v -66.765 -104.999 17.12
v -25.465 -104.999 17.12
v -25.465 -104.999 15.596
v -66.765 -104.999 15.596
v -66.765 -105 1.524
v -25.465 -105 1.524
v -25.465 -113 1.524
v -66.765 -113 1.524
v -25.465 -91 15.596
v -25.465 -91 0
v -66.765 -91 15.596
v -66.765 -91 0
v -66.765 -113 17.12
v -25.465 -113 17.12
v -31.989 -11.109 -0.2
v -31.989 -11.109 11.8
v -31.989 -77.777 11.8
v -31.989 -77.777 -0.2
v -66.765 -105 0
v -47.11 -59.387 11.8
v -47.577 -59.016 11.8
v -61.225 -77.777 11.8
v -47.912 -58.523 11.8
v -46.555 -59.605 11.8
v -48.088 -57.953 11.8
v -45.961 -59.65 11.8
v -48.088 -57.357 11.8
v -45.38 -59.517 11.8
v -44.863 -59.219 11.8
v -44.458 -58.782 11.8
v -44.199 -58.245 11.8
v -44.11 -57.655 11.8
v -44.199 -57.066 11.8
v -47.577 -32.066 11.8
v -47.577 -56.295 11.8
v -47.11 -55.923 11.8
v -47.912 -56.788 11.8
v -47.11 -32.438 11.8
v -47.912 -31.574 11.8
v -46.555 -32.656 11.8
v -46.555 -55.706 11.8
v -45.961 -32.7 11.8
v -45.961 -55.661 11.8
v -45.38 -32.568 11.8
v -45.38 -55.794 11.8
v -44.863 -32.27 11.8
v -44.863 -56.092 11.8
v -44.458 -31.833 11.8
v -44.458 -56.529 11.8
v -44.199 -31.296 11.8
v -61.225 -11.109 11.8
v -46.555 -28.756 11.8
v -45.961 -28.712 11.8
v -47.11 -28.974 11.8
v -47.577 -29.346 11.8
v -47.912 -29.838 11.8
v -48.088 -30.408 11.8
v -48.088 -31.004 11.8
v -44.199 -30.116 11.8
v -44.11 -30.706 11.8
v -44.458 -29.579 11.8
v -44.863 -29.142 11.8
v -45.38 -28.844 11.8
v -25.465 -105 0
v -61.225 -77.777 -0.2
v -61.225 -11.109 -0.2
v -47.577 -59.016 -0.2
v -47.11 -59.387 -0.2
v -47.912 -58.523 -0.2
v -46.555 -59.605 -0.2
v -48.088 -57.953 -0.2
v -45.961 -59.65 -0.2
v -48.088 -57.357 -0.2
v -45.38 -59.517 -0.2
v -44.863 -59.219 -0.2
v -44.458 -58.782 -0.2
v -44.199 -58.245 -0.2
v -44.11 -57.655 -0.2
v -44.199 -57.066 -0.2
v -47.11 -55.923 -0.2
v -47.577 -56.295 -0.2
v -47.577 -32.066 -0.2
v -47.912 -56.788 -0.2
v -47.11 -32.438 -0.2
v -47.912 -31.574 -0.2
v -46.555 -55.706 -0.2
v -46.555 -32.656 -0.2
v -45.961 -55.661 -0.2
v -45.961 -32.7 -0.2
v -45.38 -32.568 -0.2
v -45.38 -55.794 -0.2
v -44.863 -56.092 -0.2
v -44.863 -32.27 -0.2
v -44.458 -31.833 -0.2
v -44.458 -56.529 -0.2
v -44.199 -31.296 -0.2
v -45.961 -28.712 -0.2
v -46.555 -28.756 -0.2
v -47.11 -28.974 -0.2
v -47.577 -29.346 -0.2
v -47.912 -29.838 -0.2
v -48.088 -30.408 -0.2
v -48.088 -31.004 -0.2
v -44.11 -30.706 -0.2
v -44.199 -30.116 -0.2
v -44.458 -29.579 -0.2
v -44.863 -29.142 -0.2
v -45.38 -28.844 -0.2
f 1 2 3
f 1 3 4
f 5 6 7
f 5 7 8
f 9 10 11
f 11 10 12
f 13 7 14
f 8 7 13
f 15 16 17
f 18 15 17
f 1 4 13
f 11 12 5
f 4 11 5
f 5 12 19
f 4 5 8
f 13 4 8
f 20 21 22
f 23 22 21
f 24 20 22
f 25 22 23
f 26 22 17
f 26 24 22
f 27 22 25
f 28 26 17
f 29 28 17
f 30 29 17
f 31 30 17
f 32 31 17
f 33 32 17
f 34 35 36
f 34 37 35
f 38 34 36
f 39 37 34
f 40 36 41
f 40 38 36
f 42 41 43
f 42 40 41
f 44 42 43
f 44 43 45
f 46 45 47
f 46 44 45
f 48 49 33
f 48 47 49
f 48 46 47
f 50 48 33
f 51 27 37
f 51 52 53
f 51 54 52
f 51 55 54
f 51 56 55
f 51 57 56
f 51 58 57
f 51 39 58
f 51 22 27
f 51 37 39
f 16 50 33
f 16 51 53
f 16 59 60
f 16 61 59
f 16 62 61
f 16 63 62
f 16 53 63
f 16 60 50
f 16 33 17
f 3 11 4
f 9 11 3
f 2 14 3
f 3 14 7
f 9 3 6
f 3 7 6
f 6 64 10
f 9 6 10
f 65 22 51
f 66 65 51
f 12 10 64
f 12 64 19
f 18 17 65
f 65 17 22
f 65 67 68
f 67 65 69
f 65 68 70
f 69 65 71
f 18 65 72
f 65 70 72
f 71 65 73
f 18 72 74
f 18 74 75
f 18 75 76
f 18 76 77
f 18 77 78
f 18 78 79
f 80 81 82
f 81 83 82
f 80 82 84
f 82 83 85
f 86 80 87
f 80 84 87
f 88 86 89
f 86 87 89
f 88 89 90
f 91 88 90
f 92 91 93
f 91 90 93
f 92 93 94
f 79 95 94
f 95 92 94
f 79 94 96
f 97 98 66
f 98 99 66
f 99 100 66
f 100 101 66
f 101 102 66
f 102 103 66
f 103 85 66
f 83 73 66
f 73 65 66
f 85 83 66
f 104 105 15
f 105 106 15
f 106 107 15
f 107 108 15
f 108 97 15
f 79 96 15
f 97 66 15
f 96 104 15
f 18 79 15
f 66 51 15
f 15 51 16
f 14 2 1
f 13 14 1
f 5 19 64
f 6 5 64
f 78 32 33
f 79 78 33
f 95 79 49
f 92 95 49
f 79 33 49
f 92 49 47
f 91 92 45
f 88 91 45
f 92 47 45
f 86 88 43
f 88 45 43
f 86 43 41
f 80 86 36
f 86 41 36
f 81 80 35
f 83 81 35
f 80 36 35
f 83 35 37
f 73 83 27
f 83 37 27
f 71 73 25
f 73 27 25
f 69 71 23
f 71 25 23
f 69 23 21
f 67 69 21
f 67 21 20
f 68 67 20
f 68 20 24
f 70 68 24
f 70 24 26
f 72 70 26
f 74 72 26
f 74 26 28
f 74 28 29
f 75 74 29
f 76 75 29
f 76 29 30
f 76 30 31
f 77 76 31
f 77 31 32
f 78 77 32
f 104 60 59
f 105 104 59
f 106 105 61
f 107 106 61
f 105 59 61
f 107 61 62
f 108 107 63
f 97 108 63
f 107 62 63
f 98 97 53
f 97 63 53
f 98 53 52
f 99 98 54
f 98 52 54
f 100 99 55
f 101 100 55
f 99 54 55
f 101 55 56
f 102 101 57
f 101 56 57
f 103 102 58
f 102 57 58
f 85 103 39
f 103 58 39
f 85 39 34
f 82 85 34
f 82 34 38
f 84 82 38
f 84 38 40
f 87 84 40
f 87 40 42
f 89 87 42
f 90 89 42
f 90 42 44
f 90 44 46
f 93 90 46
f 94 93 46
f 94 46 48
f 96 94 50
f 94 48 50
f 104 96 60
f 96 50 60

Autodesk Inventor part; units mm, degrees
ref_plane "YZ Plane" through (0, 0, 0) normal (1, 0, 0) x (0, 1, 0)
ref_plane "XZ Plane" through (0, 0, 0) normal (0, 1, 0) x (-1, 0, 0)
ref_plane "Work Plane1" through (-89.882, 196577.8405, 29.6599) normal (0, 0, -1) x (-1, 0, 0)
ref_plane "Work Plane4" through (-3, 0, 29.6599) normal (0, 1, 0) x (1, 0, 0)
ref_plane "Work Plane5" through (-102.2297, 0, 0) normal (0, 1, 0) x (1, 0, 0)
sketch "Sketch9" plane through (-27.41, -83, 0) normal (0, 0, -1) x (-1, 0, 0)
  line L0 (-24.41, -8) -> (61.8197, -8) construction
  line L1 (-1.9451, -8) -> (-1.9451, -26) construction
  line L2 (39.3549, -26) -> (39.3549, -8) construction
  line L3 (0.0549, -28) -> (37.3549, -28) construction
  line L4 (-1.9451, -8) -> (39.3549, -8)
  line L5 (39.3549, -8) -> (39.3549, -30)
  line L6 (-1.9451, -30) -> (-1.9451, -8)
  line L7 (-1.9451, -30) -> (39.3549, -30)
  point P0 (-27.41, 83)
  dimension "d50" = 2
extrude "Extrusion5" add sketch "Sketch9" against normal blind 17.12
sketch "Sketch12" plane through (-27.41, -83, 17.12) normal (0, 0, 1) x (1, 0, 0)
  line L0 (1.9451, -8) -> (-39.3549, -8) construction
  line L1 (1.9451, -30) -> (1.9451, -8) construction
  line L2 (1.9451, -21.9992) -> (-39.4839, -21.9992) construction
  line L3 (-39.3549, -8) -> (-39.3549, -30) projected
  line L4 (-39.3549, -8) -> (1.9451, -8)
  line L5 (1.9451, -8) -> (1.9451, -21.9992)
  line L6 (1.9451, -21.9992) -> (-39.3549, -21.9992)
  line L7 (-39.3549, -21.9992) -> (-39.3549, -8)
  point P0 (27.41, 83)
extrude "Extrusion6" cut sketch "Sketch12" against normal blind 1.524
sketch "Sketch13" plane through (-27.41, -83, 0) normal (0, 0, -1) x (-1, 0, 0)
  line L0 (39.3549, -30) -> (-1.9451, -30) projected
  line L1 (39.3549, -8) -> (39.3549, -30) projected
  line L2 (-1.9451, -30) -> (39.3549, -30)
  line L3 (39.3549, -30) -> (39.3549, -22)
  line L4 (39.3549, -22) -> (-1.9451, -22)
  line L5 (-1.9451, -22) -> (-1.9451, -30)
  point P0 (-27.41, 83)
  dimension "d55" = 8
extrude "Extrusion7" cut sketch "Sketch13" against normal blind 1.524
ref_plane "Work Plane3" through (-46.1149, -8, 26.5711) normal (1, 0, 0) x (0, 0, -1)
sketch "Sketch14" plane through (-35.8127, -28.3817, 11.8) normal (0, 0, 1) x (1, 0, 0)
  circle A0 centre (-10.2977, 6.8817) radius 2.0002 construction
  circle A1 centre (-10.2977, -2.3243) radius 2
  line L0 (-10.2977, -2.3243) -> (-10.2977, -29.2737) construction
  circle A2 centre (-10.2977, -29.2737) radius 2
  point P0 (35.8127, 28.3817)
  dimension "d58" = 4
  dimension "d59" = 26.9494
  dimension "d60" = 4
sketch "Sketch15" plane through (-35.8127, -28.3817, 11.8) normal (0, 0, 1) x (1, 0, 0)
  line L0 (-25.4123, 17.2723) -> (3.8236, 17.2723)
  line L1 (3.8236, 17.2723) -> (3.8236, -49.3954)
  line L2 (3.8236, -49.3954) -> (-25.4123, -49.3954)
  line L3 (-25.4123, -49.3954) -> (-25.4123, 17.2723)
  point P0 (35.8127, 28.3817)
extrude "Extrusion8" add sketch "Sketch15" against normal blind 12
extrude "Extrusion9" cut sketch "Sketch14" against normal blind 30
properties part number "e4-phone_1piece pivot 2019"
